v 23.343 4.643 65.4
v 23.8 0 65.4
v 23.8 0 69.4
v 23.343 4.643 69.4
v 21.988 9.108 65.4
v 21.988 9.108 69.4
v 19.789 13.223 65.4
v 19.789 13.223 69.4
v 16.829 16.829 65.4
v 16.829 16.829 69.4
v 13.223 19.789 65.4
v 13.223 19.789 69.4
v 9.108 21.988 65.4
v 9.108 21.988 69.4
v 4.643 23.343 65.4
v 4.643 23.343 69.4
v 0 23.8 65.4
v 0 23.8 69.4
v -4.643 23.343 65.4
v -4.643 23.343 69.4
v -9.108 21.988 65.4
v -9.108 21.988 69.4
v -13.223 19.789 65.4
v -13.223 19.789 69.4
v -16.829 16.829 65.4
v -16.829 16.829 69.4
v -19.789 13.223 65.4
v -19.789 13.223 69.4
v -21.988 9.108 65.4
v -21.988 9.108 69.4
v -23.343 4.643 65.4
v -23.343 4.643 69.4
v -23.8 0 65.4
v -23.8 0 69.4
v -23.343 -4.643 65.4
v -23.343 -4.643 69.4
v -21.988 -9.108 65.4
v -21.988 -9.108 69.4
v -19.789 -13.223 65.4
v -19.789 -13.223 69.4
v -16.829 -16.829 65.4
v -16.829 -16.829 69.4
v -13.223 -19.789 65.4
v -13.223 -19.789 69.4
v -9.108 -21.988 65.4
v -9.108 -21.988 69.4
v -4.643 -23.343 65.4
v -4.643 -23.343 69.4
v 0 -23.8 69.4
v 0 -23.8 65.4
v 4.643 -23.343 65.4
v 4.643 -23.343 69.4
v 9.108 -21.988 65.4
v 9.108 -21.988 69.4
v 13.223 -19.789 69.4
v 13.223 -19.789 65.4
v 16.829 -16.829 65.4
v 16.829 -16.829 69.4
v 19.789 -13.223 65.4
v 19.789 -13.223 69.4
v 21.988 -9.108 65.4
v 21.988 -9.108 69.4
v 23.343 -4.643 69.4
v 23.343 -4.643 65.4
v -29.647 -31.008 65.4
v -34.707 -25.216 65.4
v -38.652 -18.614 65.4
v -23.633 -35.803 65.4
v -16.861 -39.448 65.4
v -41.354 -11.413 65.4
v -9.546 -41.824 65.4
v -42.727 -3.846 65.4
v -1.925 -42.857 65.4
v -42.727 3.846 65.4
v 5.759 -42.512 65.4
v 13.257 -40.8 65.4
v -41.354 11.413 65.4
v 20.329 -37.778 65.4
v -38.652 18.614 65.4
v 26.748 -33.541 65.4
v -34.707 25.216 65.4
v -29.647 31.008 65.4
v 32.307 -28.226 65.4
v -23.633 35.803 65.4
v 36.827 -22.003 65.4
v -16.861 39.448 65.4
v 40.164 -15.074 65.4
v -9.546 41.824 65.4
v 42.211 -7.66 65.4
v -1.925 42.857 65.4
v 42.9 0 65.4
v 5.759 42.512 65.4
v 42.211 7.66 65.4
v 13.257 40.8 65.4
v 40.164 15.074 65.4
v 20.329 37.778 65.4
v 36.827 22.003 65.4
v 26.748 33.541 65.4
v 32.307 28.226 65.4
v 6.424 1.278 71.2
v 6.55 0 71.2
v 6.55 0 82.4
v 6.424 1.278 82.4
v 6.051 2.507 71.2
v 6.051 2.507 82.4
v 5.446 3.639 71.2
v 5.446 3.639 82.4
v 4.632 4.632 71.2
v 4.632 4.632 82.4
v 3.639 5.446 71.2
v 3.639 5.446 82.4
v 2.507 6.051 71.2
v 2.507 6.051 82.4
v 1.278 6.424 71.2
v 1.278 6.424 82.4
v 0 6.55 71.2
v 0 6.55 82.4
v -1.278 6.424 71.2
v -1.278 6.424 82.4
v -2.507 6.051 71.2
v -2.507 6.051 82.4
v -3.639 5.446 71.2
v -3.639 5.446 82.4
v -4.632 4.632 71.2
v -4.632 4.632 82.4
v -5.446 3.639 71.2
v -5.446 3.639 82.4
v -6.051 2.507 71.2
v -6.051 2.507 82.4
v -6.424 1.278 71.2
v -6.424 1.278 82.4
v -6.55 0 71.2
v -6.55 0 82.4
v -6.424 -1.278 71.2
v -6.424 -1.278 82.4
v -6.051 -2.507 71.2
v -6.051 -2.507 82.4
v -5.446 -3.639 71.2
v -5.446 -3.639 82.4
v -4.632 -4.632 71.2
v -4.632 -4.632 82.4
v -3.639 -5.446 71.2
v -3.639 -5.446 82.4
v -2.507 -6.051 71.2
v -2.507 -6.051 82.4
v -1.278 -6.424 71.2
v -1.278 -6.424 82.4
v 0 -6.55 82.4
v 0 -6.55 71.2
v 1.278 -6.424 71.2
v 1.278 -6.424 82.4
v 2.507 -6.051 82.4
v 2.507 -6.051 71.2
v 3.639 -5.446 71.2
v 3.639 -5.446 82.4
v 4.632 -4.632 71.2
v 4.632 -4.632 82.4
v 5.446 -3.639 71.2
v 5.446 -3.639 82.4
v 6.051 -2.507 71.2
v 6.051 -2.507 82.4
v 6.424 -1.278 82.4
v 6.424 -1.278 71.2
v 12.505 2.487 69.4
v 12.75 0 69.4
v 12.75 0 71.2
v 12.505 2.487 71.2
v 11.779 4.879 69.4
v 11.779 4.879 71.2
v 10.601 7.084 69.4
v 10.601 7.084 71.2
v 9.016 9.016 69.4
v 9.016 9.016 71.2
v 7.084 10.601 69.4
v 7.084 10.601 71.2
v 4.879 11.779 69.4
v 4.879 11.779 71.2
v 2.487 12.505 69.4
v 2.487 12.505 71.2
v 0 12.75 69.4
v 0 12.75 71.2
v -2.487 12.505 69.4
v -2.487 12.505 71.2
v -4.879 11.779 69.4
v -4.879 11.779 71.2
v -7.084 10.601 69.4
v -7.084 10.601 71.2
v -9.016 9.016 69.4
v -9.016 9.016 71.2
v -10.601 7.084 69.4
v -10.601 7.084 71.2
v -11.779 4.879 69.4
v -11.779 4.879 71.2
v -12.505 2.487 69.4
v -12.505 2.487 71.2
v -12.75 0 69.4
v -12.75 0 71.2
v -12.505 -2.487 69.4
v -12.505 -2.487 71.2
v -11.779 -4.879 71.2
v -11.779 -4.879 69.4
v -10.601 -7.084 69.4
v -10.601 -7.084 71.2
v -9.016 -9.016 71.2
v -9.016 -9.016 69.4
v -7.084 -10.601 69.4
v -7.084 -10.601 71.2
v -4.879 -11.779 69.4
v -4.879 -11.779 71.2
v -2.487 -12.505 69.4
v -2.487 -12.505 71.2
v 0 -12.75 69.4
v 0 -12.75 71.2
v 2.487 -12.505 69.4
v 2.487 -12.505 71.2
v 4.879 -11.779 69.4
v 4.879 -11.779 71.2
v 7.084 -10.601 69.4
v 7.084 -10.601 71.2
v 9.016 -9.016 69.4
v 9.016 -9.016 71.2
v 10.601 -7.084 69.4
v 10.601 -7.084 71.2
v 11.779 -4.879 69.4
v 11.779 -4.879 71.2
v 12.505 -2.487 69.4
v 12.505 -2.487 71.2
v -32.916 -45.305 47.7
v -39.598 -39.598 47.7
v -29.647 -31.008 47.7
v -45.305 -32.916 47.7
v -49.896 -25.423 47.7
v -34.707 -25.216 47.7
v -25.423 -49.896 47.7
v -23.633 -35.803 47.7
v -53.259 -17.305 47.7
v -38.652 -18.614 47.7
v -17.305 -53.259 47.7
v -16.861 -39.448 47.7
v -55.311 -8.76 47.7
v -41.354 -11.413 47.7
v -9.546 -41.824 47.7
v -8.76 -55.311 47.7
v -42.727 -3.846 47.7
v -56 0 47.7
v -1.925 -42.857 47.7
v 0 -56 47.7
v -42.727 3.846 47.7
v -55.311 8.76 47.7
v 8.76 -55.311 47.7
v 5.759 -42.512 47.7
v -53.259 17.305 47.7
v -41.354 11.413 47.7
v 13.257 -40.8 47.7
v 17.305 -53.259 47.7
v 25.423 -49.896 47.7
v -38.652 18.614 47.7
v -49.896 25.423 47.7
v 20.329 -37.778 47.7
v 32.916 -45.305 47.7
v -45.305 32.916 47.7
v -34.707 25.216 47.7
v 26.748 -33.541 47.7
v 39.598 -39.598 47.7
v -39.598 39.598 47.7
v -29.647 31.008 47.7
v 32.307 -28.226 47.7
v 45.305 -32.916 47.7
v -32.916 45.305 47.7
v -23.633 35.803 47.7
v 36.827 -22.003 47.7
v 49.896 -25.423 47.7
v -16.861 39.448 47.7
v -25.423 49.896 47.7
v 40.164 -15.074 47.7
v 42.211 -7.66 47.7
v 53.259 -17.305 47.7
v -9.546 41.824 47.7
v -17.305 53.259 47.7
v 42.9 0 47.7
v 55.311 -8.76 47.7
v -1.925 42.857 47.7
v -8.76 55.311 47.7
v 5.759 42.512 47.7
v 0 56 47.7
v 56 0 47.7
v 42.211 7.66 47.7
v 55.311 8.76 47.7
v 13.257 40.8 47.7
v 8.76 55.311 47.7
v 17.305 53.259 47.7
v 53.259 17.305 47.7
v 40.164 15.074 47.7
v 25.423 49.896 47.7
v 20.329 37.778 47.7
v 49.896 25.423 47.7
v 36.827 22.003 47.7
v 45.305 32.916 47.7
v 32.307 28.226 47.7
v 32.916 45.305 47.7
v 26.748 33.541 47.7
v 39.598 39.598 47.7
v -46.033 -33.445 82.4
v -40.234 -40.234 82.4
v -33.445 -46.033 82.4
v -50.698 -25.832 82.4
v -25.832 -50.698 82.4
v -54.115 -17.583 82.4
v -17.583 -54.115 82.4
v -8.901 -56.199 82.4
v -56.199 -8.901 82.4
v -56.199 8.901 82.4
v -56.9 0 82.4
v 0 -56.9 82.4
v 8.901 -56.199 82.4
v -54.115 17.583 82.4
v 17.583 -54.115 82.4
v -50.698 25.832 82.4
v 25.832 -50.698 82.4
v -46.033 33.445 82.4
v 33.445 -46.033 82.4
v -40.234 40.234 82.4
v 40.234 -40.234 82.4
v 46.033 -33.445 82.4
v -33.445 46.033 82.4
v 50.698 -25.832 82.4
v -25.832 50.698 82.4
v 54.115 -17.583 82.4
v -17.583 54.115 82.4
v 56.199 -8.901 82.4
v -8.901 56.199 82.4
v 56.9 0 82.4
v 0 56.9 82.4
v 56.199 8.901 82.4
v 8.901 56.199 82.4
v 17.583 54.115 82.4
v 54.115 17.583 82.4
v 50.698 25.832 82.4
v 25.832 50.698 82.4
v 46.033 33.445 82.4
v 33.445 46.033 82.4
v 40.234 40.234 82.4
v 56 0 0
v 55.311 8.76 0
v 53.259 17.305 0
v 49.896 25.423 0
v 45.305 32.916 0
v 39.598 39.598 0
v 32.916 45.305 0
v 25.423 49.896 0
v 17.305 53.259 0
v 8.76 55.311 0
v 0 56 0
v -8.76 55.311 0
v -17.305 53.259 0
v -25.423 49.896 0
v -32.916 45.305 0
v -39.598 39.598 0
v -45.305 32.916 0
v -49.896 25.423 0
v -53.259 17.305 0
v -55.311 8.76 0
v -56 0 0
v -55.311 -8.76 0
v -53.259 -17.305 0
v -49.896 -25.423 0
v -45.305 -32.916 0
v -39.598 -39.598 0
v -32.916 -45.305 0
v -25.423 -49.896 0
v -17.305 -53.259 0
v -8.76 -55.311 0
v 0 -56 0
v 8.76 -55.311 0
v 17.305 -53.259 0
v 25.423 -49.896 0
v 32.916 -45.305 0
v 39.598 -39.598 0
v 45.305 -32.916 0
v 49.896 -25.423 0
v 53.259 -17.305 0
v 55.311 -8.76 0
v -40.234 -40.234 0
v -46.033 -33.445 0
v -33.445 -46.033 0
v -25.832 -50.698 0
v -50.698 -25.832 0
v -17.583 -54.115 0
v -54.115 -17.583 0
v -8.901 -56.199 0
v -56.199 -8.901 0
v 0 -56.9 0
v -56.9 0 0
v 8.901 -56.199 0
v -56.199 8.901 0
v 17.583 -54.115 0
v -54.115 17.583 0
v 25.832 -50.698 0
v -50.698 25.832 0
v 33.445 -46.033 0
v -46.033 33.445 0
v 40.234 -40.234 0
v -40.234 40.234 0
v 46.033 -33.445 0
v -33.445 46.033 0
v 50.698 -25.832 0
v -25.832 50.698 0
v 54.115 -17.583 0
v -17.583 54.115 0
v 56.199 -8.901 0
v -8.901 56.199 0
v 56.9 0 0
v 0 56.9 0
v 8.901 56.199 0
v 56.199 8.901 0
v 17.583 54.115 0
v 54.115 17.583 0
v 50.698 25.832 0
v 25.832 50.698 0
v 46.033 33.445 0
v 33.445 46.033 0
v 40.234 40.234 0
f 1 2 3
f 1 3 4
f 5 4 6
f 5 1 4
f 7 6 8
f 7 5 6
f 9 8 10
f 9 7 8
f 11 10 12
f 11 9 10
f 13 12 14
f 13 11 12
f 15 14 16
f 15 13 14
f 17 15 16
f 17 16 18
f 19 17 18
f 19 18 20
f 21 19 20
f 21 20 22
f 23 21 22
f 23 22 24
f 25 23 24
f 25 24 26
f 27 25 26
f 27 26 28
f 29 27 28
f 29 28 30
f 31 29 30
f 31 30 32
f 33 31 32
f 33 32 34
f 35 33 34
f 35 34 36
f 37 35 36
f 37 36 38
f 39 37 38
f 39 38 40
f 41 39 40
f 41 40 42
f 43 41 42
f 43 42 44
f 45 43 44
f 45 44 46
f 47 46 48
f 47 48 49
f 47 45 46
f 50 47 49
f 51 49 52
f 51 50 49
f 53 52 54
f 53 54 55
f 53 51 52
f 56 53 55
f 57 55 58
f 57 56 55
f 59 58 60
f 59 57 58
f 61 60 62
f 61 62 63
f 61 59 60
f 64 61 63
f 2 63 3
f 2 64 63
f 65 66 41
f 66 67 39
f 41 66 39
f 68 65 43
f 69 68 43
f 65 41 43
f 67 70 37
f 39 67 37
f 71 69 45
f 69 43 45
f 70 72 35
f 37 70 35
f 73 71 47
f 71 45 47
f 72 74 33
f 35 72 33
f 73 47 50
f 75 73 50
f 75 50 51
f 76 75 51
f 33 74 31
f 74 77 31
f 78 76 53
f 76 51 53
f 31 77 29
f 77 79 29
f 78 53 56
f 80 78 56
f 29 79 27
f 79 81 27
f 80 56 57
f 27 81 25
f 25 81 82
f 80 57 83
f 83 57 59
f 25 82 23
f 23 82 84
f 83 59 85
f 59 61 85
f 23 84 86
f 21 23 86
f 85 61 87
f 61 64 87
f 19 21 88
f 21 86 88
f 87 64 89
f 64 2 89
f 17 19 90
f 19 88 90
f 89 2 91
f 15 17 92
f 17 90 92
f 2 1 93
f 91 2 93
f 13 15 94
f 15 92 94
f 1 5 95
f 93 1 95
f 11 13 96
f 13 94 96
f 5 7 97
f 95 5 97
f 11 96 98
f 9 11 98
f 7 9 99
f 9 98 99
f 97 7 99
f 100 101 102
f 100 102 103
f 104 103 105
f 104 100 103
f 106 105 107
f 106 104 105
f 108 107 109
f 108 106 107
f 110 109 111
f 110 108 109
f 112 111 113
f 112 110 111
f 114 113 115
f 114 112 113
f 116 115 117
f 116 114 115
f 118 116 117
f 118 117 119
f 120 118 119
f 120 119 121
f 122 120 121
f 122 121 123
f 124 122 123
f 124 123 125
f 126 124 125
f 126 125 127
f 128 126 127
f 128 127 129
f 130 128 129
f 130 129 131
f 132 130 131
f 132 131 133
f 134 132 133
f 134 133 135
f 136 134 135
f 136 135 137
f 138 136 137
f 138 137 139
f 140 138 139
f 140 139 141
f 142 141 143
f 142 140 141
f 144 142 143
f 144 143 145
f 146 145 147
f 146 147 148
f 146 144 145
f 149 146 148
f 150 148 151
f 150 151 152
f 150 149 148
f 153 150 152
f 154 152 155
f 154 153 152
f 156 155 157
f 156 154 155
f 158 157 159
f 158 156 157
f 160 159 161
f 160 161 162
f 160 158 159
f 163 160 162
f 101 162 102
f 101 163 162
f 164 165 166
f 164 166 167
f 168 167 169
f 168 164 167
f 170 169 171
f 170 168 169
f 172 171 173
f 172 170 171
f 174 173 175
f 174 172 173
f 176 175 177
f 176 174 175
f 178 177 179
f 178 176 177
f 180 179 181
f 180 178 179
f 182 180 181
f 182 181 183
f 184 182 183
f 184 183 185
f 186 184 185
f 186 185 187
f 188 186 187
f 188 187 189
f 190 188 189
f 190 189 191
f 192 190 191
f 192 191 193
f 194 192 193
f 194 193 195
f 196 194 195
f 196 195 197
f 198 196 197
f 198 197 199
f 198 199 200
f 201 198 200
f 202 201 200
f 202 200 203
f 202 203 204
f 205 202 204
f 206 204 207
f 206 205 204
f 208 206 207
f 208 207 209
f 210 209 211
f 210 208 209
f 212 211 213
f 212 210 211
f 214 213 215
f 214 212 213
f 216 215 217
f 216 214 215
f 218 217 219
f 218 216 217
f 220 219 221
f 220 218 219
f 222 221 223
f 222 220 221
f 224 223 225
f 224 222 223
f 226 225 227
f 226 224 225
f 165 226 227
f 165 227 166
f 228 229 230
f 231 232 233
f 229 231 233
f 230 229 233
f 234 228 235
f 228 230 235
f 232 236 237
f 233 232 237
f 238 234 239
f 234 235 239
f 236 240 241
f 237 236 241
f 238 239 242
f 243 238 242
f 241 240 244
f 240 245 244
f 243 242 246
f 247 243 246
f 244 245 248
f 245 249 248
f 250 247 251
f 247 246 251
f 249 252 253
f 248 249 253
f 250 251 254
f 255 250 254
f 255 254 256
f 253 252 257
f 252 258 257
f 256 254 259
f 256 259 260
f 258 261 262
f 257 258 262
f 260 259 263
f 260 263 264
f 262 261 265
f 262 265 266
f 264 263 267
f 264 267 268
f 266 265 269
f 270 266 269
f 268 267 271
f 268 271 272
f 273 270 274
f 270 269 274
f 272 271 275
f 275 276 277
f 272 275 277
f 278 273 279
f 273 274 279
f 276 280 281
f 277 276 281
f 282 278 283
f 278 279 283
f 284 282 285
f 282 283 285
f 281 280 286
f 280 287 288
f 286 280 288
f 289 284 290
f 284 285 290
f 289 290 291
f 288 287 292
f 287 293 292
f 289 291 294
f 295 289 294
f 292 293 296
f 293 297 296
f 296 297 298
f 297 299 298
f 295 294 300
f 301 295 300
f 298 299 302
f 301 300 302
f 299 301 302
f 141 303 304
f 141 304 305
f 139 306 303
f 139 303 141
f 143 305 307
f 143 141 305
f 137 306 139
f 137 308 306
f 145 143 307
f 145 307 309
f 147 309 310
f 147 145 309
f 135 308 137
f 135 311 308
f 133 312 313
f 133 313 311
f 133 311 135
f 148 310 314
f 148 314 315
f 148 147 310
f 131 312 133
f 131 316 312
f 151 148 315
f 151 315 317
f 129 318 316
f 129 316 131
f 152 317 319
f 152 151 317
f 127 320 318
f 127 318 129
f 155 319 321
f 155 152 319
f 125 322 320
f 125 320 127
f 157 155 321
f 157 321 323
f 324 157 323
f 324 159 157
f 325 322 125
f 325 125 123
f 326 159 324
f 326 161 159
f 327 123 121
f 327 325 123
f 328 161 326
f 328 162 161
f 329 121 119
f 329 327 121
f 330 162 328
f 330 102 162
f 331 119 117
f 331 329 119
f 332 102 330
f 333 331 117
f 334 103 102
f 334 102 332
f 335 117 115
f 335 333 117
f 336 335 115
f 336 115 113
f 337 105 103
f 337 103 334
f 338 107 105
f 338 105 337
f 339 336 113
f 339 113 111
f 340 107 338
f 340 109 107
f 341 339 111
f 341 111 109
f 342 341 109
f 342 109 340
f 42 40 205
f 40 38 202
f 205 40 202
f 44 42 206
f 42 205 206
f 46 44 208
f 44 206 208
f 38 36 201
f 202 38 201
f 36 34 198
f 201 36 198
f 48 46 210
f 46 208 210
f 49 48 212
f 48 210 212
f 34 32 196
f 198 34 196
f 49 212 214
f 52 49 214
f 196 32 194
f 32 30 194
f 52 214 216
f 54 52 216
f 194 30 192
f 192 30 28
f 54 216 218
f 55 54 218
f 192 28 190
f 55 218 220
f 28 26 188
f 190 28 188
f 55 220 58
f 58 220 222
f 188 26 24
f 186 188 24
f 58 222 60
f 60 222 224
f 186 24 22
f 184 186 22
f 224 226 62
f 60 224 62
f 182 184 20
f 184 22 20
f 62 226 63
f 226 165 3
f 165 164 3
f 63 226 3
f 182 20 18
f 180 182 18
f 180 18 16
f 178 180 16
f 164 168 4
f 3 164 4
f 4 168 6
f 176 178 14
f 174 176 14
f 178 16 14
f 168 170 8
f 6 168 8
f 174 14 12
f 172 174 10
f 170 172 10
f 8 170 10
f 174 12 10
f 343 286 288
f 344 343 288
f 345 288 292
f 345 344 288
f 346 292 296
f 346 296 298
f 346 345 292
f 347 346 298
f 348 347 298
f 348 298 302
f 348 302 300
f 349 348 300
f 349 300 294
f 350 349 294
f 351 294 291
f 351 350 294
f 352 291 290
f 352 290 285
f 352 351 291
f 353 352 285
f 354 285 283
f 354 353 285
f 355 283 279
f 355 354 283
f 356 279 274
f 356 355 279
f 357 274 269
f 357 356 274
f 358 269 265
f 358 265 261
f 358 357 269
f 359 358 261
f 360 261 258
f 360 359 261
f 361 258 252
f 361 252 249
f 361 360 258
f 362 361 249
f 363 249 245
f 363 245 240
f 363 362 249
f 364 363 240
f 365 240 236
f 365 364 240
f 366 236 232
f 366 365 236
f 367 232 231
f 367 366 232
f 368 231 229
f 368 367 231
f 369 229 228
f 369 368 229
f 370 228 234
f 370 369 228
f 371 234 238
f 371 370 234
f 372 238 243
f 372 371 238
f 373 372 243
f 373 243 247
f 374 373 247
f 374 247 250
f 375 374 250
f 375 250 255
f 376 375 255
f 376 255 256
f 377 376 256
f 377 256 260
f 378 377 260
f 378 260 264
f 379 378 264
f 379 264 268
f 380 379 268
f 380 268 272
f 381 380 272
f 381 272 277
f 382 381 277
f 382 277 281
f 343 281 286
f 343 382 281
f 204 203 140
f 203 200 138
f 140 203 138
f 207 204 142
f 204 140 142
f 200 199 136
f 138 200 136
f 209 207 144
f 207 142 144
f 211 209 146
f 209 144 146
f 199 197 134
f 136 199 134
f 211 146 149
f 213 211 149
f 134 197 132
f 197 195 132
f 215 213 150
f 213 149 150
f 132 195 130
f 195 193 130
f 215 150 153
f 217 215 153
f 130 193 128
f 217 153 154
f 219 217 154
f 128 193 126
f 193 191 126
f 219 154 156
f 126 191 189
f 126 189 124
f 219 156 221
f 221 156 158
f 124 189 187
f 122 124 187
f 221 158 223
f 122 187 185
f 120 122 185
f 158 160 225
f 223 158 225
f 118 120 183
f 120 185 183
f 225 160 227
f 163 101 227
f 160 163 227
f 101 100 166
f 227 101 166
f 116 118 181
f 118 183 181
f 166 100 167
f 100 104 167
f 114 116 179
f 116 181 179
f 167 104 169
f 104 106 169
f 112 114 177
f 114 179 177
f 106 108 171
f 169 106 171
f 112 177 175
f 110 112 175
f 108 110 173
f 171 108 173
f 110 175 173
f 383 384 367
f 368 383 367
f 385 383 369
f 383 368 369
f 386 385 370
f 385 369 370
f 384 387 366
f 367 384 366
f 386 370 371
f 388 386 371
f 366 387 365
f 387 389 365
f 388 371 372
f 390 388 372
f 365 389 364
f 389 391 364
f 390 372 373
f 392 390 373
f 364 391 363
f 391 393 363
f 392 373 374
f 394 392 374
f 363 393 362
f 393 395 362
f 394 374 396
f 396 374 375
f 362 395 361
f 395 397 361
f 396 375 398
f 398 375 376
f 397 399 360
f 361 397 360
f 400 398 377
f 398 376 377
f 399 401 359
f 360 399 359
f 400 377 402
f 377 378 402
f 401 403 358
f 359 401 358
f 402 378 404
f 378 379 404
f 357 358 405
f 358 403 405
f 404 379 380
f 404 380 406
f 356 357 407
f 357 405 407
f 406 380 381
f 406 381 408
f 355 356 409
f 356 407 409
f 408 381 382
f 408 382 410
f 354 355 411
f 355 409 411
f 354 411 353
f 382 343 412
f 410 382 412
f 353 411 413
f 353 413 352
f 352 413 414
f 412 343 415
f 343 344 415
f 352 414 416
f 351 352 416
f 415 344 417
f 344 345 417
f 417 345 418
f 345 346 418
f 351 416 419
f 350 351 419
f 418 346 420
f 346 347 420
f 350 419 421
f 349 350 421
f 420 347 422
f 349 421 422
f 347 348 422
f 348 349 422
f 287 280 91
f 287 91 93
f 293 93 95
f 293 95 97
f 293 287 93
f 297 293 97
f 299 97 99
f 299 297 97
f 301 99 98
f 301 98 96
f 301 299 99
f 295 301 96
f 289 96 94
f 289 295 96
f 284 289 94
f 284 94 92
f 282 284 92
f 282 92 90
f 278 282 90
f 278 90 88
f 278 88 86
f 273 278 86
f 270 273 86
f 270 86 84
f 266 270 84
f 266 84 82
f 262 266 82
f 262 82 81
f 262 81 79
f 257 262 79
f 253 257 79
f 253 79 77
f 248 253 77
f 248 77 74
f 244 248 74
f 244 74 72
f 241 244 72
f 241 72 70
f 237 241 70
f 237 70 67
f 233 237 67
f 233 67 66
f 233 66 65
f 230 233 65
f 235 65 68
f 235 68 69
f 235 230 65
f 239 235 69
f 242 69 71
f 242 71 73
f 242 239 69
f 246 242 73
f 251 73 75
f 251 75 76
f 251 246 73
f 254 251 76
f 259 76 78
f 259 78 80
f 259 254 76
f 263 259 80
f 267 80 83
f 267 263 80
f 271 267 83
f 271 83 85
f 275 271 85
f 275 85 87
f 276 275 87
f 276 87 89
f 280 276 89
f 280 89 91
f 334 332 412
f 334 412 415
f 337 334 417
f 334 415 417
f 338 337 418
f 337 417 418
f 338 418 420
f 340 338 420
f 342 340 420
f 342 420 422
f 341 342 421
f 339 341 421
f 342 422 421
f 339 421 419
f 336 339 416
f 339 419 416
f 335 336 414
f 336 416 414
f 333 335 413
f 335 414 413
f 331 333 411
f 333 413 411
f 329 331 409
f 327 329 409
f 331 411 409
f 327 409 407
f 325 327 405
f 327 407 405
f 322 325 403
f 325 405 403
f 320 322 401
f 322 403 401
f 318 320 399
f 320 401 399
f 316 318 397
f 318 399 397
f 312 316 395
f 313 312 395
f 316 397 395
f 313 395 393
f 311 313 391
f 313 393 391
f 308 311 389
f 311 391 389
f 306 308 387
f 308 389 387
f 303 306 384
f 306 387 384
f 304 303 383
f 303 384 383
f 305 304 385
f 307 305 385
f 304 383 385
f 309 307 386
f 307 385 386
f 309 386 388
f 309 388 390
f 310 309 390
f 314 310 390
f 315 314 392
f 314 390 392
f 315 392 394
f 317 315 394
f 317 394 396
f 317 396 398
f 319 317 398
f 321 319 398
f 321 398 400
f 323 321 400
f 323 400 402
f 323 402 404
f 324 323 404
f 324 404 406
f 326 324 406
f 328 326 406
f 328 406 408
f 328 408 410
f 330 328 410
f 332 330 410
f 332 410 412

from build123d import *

# Parameters (mm, degrees)
F0_R      = 56.9
F1_DEPTH  = 82.4
F2_R      = 6.55
F3_DEPTH  = 82.4
F4_R      = 56
F5_DEPTH  = 47.7
F6_R      = 42.9
F7_DEPTH  = 65.4
F8_R      = 23.8
F9_DEPTH  = 69.4
F10_R     = 12.75
F11_DEPTH = 71.2


with BuildPart() as f1:
    # F0 (on Top) → F1 (new body)
    with BuildSketch(Plane.XY):
        Circle(F0_R)
    extrude(amount=F1_DEPTH)

    # F2 (on Top) → F3 (cut)
    with BuildSketch(Plane.XY):
        Circle(F2_R)
    extrude(amount=F3_DEPTH, mode=Mode.SUBTRACT)

    # F4 (on Top) → F5 (cut)
    with BuildSketch(Plane.XY):
        Circle(F4_R)
    extrude(amount=F5_DEPTH, mode=Mode.SUBTRACT)

    # F6 (on Top) → F7 (cut)
    with BuildSketch(Plane.XY):
        Circle(F6_R)
    extrude(amount=F7_DEPTH, mode=Mode.SUBTRACT)

    # F8 (on Top) → F9 (cut)
    with BuildSketch(Plane.XY):
        Circle(F8_R)
    extrude(amount=F9_DEPTH, mode=Mode.SUBTRACT)

    # F10 (on Top) → F11 (cut)
    with BuildSketch(Plane.XY):
        Circle(F10_R)
    extrude(amount=F11_DEPTH, mode=Mode.SUBTRACT)


solid = f1.part
